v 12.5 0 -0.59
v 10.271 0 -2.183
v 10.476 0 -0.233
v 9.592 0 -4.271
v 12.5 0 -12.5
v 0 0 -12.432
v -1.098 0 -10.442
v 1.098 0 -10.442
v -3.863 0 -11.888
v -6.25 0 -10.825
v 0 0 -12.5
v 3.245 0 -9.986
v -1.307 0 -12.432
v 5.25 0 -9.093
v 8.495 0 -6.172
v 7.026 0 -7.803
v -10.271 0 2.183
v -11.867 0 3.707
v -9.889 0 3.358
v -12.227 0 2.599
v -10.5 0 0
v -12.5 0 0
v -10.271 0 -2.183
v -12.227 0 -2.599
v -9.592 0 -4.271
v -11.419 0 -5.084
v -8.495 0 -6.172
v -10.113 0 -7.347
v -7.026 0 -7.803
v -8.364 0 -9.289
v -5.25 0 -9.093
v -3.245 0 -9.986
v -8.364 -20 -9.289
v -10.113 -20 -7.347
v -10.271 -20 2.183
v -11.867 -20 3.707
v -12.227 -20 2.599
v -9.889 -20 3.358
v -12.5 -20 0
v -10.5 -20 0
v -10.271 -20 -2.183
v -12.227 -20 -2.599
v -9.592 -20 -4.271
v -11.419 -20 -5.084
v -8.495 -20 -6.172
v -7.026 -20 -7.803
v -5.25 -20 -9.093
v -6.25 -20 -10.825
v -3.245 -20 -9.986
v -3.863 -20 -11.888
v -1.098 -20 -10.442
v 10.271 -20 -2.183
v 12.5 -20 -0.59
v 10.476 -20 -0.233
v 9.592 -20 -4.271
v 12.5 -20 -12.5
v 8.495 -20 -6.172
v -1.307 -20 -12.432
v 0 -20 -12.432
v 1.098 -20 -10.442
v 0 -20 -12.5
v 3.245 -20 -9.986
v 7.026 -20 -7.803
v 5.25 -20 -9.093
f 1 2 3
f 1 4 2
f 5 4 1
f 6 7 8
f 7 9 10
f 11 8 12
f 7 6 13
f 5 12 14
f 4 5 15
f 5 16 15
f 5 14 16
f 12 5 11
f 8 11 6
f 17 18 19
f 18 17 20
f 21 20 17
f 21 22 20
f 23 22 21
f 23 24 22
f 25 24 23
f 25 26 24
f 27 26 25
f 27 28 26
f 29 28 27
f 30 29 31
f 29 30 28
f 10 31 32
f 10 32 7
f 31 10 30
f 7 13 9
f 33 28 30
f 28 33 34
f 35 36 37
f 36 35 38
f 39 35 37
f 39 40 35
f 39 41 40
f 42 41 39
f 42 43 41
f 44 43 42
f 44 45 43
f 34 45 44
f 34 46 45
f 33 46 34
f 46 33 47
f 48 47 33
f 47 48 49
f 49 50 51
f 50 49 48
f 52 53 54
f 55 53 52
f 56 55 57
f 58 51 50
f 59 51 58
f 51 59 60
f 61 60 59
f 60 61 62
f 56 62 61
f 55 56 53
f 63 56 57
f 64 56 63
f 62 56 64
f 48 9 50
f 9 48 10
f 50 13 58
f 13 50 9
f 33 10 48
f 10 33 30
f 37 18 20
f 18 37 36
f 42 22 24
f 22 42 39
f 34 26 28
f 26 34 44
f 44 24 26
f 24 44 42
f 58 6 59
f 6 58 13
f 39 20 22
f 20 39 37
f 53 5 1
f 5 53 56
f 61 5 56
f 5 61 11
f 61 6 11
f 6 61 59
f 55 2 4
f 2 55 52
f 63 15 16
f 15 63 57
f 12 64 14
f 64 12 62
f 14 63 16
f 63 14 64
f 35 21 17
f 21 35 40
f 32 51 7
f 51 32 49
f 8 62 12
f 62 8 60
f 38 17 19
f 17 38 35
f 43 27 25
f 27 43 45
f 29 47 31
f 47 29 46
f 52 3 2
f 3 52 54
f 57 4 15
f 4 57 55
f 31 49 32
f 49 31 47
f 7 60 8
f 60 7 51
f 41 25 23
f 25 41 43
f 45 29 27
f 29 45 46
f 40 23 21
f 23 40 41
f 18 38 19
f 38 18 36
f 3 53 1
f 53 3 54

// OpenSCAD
difference(){
union(){
rotate([90,0,0])cylinder(20,d=25);
translate([0,-20,-25/2])cube([25/2,20,25]);
}
translate([0,2,0])rotate([90,0,0])cylinder(55,d=25-4);
translate([0,-25,50/2+2])rotate([0,10,0])cube([50,100,50],center=true);
}

//cylinder(r=6/2*3.14,h=20);
